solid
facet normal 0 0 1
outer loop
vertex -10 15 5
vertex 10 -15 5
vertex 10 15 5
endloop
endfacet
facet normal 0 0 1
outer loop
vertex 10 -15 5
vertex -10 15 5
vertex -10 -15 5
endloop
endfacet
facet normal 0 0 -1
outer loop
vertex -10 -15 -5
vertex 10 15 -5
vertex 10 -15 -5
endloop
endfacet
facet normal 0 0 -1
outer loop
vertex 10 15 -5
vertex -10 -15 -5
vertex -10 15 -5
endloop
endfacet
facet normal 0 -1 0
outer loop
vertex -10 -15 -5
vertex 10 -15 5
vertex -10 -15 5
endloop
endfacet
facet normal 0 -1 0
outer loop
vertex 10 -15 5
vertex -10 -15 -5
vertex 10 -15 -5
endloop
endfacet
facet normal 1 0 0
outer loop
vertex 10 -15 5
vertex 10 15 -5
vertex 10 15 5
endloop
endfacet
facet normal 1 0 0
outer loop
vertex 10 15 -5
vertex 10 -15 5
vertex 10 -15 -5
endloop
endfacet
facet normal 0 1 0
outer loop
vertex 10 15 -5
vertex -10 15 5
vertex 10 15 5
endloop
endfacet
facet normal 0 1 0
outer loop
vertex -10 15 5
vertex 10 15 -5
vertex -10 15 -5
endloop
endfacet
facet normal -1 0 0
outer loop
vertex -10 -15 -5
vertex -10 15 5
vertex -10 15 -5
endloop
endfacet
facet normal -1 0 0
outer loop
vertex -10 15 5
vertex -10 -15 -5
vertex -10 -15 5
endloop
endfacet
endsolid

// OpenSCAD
// Define dimensions for the rectangular block
block_width = 20;  // Width of the block
block_height = 10; // Height of the block
block_depth = 30;  // Depth of the block

// Function to create a rectangular block
module rectangular_block() {
    cube([block_width, block_depth, block_height], center = true);
}

// Generate a single solid block by merging all layers
rectangular_block();
